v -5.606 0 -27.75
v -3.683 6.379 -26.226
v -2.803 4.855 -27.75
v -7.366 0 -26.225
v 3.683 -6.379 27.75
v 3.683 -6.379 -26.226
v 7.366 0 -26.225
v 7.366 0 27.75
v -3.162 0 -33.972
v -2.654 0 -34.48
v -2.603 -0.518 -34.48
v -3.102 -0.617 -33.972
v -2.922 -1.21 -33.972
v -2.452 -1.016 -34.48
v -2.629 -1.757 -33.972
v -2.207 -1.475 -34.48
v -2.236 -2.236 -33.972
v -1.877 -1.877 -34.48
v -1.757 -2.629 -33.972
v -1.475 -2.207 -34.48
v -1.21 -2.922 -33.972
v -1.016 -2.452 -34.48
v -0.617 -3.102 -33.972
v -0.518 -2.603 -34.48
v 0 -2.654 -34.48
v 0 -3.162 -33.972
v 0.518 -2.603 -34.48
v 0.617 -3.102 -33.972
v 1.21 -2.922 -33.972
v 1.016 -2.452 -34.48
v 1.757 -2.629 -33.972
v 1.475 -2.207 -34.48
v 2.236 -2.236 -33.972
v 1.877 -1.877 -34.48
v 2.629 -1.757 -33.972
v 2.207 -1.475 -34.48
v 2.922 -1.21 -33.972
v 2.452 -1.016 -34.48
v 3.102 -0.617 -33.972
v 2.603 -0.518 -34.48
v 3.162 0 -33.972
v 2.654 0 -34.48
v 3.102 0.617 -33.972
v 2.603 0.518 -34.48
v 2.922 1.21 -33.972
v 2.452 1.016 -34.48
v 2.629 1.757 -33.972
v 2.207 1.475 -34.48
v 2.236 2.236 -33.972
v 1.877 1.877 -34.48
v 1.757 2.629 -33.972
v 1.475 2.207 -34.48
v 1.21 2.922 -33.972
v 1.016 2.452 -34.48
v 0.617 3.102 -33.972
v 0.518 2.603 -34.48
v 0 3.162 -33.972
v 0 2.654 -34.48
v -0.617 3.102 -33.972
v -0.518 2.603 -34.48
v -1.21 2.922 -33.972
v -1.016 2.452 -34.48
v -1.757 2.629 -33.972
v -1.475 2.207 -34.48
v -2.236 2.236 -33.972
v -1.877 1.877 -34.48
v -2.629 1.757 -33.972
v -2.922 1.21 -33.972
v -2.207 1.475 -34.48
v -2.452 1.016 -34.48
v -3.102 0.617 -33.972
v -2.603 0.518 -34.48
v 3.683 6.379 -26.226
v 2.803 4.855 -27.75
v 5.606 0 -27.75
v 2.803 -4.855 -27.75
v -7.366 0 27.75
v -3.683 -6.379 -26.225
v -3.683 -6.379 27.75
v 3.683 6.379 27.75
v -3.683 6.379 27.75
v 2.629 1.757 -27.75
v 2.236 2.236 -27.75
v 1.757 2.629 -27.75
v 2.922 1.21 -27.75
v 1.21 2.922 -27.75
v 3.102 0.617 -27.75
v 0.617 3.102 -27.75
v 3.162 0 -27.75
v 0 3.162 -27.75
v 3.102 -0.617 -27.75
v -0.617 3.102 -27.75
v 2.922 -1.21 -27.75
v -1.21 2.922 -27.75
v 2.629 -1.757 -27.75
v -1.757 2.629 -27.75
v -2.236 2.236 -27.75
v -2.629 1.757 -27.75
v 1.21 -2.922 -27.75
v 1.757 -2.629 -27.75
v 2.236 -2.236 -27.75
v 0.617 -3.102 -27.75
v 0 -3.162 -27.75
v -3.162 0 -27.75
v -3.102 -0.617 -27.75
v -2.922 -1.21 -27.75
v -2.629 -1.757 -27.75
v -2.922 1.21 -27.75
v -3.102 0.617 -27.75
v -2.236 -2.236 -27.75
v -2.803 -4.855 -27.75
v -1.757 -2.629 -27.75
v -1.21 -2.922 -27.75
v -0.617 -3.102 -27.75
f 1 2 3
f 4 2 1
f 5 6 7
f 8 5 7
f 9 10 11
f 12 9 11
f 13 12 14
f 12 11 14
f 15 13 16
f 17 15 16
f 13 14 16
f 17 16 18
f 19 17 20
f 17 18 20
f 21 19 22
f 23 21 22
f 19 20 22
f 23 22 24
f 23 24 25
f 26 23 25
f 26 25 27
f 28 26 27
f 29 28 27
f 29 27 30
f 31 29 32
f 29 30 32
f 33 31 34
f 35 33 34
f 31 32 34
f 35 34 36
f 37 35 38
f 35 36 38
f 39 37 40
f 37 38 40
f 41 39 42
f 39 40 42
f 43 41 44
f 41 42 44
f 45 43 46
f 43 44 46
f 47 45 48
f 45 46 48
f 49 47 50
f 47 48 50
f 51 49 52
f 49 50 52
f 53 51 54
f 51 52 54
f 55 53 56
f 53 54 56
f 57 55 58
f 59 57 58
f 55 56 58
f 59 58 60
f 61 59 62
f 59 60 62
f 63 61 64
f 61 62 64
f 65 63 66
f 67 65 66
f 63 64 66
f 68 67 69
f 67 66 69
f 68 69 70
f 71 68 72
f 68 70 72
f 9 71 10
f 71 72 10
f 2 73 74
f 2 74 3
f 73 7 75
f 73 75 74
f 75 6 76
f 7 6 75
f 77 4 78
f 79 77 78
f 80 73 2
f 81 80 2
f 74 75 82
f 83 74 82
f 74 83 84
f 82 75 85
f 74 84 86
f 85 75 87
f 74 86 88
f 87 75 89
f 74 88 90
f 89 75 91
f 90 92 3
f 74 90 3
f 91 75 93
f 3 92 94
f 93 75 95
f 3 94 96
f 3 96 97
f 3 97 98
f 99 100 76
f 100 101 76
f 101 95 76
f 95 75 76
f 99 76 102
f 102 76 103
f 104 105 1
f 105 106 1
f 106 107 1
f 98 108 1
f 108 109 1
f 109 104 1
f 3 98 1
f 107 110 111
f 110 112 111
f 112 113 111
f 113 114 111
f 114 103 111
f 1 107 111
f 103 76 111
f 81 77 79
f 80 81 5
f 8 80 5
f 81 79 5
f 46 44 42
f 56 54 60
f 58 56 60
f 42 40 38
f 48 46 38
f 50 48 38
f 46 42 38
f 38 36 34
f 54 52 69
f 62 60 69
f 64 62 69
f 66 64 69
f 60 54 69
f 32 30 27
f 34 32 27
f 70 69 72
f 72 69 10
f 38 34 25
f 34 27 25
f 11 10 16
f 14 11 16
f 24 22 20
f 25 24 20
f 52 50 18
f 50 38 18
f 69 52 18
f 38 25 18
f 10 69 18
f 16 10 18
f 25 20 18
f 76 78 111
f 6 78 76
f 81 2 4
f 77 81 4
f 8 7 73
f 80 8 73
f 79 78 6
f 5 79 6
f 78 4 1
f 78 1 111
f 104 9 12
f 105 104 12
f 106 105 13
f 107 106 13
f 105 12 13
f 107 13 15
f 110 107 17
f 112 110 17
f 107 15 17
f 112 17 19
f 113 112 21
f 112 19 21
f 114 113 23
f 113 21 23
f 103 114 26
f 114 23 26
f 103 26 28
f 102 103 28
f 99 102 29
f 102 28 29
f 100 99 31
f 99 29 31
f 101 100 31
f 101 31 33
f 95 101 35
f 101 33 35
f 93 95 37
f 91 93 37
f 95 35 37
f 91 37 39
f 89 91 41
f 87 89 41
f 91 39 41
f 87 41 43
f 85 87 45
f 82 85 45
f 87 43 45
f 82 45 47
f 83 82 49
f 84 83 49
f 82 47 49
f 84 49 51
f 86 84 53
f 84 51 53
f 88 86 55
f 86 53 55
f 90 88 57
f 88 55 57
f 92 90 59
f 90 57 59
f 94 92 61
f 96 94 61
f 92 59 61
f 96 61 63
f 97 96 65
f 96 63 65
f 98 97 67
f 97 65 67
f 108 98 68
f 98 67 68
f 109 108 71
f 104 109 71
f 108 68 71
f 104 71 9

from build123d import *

# Parameters (mm, degrees)
CHAMFER1_SIZE  = 0.50801365
EXTRUDE1_REACH = 57.499
CHAMFER2_SIZE  = 1.524


with BuildPart() as part:
    # Sketch1 → Revolve1 (revolve)
    with BuildSketch(Plane(origin=(0, 0, 0), x_dir=(1, 0, 0), z_dir=(0, 1, 0)), mode=Mode.PRIVATE) as revolve1_sk:
        Polygon((7.366, -27.7495), (7.366, 27.7495), (3.1623, 27.7495), (3.1623, 34.4805), (0, 34.4805), (0, -27.7495), align=None)
    revolve(revolve1_sk.sketch.rotate(Axis((0, 0, -34.4805), (0, 0, 1)), 180), axis=Axis((0, 0, -34.4805), (0, 0, 1)))  # turned: the seam where the file's is

    # Chamfer1
    chamfer1_edges = [part.edges().sort_by_distance(p)[0] for p in [
        (3.1623, 0, -34.4805),
    ]]
    chamfer(chamfer1_edges, length=CHAMFER1_SIZE)

    # Sketch2 → Extrude1 (cut, up to next)
    with BuildSketch(Plane(origin=(0, 0, -27.7495), x_dir=(-1, 0, 0), z_dir=(0, 0, -1)), mode=Mode.PRIVATE) as extrude1_sk1:
        with BuildLine():
            ThreePointArc((3.683, 6.379143124), (0, 7.366), (-3.683, 6.379143124))
            Line((-3.683, 6.379143124), (3.683, 6.379143124))
        make_face()
    extrude1_tool1 = extrude(extrude1_sk1.sketch, amount=-EXTRUDE1_REACH, mode=Mode.PRIVATE) & part.part
    add(extrude1_tool1.solids().sort_by_distance((0, 6.776244, -27.7495))[0], mode=Mode.SUBTRACT)
    # Sketch2 → Extrude1 (cut, up to next)
    with BuildSketch(Plane(origin=(0, 0, -27.7495), x_dir=(-1, 0, 0), z_dir=(0, 0, -1)), mode=Mode.PRIVATE) as extrude1_sk2:
        with BuildLine():
            ThreePointArc((7.366, 0), (6.379143124, 3.683), (3.683, 6.379143124))
            Line((3.683, 6.379143124), (7.366, 0))
        make_face()
    extrude1_tool2 = extrude(extrude1_sk2.sketch, amount=-EXTRUDE1_REACH, mode=Mode.PRIVATE) & part.part
    add(extrude1_tool2.solids().sort_by_distance((-5.868399, 3.388122, -27.7495))[0], mode=Mode.SUBTRACT)
    # Sketch2 → Extrude1 (cut, up to next)
    with BuildSketch(Plane(origin=(0, 0, -27.7495), x_dir=(-1, 0, 0), z_dir=(0, 0, -1)), mode=Mode.PRIVATE) as extrude1_sk3:
        with BuildLine():
            Line((7.366, 0), (3.683, -6.379143124))
            ThreePointArc((3.683, -6.379143124), (6.379143124, -3.683), (7.366, 0))
        make_face()
    extrude1_tool3 = extrude(extrude1_sk3.sketch, amount=-EXTRUDE1_REACH, mode=Mode.PRIVATE) & part.part
    add(extrude1_tool3.solids().sort_by_distance((-5.868399, -3.388122, -27.7495))[0], mode=Mode.SUBTRACT)
    # Sketch2 → Extrude1 (cut, up to next)
    with BuildSketch(Plane(origin=(0, 0, -27.7495), x_dir=(-1, 0, 0), z_dir=(0, 0, -1)), mode=Mode.PRIVATE) as extrude1_sk4:
        with BuildLine():
            Line((3.683, -6.379143124), (-3.683, -6.379143124))
            ThreePointArc((-3.683, -6.379143124), (0, -7.366), (3.683, -6.379143124))
        make_face()
    extrude1_tool4 = extrude(extrude1_sk4.sketch, amount=-EXTRUDE1_REACH, mode=Mode.PRIVATE) & part.part
    add(extrude1_tool4.solids().sort_by_distance((0, -6.776244, -27.7495))[0], mode=Mode.SUBTRACT)
    # Sketch2 → Extrude1 (cut, up to next)
    with BuildSketch(Plane(origin=(0, 0, -27.7495), x_dir=(-1, 0, 0), z_dir=(0, 0, -1)), mode=Mode.PRIVATE) as extrude1_sk5:
        with BuildLine():
            Line((-3.683, -6.379143124), (-7.366, 0))
            ThreePointArc((-7.366, 0), (-6.379143124, -3.683), (-3.683, -6.379143124))
        make_face()
    extrude1_tool5 = extrude(extrude1_sk5.sketch, amount=-EXTRUDE1_REACH, mode=Mode.PRIVATE) & part.part
    add(extrude1_tool5.solids().sort_by_distance((5.868399, -3.388122, -27.7495))[0], mode=Mode.SUBTRACT)
    # Sketch2 → Extrude1 (cut, up to next)
    with BuildSketch(Plane(origin=(0, 0, -27.7495), x_dir=(-1, 0, 0), z_dir=(0, 0, -1)), mode=Mode.PRIVATE) as extrude1_sk6:
        with BuildLine():
            ThreePointArc((-3.683, 6.379143124), (-6.379143124, 3.683), (-7.366, 0))
            Line((-7.366, 0), (-3.683, 6.379143124))
        make_face()
    extrude1_tool6 = extrude(extrude1_sk6.sketch, amount=-EXTRUDE1_REACH, mode=Mode.PRIVATE) & part.part
    add(extrude1_tool6.solids().sort_by_distance((5.868399, 3.388122, -27.7495))[0], mode=Mode.SUBTRACT)

    # Chamfer2
    chamfer2_edges = [part.edges().sort_by_distance(p)[0] for p in [
        (0, 6.379143124, -27.7495),
        (-5.5245, 3.189571562, -27.7495),
        (-5.5245, -3.189571562, -27.7495),
        (0, -6.379143124, -27.7495),
        (5.5245, -3.189571562, -27.7495),
        (5.5245, 3.189571562, -27.7495),
    ]]
    chamfer(chamfer2_edges, length=CHAMFER2_SIZE)


solid = part.part
